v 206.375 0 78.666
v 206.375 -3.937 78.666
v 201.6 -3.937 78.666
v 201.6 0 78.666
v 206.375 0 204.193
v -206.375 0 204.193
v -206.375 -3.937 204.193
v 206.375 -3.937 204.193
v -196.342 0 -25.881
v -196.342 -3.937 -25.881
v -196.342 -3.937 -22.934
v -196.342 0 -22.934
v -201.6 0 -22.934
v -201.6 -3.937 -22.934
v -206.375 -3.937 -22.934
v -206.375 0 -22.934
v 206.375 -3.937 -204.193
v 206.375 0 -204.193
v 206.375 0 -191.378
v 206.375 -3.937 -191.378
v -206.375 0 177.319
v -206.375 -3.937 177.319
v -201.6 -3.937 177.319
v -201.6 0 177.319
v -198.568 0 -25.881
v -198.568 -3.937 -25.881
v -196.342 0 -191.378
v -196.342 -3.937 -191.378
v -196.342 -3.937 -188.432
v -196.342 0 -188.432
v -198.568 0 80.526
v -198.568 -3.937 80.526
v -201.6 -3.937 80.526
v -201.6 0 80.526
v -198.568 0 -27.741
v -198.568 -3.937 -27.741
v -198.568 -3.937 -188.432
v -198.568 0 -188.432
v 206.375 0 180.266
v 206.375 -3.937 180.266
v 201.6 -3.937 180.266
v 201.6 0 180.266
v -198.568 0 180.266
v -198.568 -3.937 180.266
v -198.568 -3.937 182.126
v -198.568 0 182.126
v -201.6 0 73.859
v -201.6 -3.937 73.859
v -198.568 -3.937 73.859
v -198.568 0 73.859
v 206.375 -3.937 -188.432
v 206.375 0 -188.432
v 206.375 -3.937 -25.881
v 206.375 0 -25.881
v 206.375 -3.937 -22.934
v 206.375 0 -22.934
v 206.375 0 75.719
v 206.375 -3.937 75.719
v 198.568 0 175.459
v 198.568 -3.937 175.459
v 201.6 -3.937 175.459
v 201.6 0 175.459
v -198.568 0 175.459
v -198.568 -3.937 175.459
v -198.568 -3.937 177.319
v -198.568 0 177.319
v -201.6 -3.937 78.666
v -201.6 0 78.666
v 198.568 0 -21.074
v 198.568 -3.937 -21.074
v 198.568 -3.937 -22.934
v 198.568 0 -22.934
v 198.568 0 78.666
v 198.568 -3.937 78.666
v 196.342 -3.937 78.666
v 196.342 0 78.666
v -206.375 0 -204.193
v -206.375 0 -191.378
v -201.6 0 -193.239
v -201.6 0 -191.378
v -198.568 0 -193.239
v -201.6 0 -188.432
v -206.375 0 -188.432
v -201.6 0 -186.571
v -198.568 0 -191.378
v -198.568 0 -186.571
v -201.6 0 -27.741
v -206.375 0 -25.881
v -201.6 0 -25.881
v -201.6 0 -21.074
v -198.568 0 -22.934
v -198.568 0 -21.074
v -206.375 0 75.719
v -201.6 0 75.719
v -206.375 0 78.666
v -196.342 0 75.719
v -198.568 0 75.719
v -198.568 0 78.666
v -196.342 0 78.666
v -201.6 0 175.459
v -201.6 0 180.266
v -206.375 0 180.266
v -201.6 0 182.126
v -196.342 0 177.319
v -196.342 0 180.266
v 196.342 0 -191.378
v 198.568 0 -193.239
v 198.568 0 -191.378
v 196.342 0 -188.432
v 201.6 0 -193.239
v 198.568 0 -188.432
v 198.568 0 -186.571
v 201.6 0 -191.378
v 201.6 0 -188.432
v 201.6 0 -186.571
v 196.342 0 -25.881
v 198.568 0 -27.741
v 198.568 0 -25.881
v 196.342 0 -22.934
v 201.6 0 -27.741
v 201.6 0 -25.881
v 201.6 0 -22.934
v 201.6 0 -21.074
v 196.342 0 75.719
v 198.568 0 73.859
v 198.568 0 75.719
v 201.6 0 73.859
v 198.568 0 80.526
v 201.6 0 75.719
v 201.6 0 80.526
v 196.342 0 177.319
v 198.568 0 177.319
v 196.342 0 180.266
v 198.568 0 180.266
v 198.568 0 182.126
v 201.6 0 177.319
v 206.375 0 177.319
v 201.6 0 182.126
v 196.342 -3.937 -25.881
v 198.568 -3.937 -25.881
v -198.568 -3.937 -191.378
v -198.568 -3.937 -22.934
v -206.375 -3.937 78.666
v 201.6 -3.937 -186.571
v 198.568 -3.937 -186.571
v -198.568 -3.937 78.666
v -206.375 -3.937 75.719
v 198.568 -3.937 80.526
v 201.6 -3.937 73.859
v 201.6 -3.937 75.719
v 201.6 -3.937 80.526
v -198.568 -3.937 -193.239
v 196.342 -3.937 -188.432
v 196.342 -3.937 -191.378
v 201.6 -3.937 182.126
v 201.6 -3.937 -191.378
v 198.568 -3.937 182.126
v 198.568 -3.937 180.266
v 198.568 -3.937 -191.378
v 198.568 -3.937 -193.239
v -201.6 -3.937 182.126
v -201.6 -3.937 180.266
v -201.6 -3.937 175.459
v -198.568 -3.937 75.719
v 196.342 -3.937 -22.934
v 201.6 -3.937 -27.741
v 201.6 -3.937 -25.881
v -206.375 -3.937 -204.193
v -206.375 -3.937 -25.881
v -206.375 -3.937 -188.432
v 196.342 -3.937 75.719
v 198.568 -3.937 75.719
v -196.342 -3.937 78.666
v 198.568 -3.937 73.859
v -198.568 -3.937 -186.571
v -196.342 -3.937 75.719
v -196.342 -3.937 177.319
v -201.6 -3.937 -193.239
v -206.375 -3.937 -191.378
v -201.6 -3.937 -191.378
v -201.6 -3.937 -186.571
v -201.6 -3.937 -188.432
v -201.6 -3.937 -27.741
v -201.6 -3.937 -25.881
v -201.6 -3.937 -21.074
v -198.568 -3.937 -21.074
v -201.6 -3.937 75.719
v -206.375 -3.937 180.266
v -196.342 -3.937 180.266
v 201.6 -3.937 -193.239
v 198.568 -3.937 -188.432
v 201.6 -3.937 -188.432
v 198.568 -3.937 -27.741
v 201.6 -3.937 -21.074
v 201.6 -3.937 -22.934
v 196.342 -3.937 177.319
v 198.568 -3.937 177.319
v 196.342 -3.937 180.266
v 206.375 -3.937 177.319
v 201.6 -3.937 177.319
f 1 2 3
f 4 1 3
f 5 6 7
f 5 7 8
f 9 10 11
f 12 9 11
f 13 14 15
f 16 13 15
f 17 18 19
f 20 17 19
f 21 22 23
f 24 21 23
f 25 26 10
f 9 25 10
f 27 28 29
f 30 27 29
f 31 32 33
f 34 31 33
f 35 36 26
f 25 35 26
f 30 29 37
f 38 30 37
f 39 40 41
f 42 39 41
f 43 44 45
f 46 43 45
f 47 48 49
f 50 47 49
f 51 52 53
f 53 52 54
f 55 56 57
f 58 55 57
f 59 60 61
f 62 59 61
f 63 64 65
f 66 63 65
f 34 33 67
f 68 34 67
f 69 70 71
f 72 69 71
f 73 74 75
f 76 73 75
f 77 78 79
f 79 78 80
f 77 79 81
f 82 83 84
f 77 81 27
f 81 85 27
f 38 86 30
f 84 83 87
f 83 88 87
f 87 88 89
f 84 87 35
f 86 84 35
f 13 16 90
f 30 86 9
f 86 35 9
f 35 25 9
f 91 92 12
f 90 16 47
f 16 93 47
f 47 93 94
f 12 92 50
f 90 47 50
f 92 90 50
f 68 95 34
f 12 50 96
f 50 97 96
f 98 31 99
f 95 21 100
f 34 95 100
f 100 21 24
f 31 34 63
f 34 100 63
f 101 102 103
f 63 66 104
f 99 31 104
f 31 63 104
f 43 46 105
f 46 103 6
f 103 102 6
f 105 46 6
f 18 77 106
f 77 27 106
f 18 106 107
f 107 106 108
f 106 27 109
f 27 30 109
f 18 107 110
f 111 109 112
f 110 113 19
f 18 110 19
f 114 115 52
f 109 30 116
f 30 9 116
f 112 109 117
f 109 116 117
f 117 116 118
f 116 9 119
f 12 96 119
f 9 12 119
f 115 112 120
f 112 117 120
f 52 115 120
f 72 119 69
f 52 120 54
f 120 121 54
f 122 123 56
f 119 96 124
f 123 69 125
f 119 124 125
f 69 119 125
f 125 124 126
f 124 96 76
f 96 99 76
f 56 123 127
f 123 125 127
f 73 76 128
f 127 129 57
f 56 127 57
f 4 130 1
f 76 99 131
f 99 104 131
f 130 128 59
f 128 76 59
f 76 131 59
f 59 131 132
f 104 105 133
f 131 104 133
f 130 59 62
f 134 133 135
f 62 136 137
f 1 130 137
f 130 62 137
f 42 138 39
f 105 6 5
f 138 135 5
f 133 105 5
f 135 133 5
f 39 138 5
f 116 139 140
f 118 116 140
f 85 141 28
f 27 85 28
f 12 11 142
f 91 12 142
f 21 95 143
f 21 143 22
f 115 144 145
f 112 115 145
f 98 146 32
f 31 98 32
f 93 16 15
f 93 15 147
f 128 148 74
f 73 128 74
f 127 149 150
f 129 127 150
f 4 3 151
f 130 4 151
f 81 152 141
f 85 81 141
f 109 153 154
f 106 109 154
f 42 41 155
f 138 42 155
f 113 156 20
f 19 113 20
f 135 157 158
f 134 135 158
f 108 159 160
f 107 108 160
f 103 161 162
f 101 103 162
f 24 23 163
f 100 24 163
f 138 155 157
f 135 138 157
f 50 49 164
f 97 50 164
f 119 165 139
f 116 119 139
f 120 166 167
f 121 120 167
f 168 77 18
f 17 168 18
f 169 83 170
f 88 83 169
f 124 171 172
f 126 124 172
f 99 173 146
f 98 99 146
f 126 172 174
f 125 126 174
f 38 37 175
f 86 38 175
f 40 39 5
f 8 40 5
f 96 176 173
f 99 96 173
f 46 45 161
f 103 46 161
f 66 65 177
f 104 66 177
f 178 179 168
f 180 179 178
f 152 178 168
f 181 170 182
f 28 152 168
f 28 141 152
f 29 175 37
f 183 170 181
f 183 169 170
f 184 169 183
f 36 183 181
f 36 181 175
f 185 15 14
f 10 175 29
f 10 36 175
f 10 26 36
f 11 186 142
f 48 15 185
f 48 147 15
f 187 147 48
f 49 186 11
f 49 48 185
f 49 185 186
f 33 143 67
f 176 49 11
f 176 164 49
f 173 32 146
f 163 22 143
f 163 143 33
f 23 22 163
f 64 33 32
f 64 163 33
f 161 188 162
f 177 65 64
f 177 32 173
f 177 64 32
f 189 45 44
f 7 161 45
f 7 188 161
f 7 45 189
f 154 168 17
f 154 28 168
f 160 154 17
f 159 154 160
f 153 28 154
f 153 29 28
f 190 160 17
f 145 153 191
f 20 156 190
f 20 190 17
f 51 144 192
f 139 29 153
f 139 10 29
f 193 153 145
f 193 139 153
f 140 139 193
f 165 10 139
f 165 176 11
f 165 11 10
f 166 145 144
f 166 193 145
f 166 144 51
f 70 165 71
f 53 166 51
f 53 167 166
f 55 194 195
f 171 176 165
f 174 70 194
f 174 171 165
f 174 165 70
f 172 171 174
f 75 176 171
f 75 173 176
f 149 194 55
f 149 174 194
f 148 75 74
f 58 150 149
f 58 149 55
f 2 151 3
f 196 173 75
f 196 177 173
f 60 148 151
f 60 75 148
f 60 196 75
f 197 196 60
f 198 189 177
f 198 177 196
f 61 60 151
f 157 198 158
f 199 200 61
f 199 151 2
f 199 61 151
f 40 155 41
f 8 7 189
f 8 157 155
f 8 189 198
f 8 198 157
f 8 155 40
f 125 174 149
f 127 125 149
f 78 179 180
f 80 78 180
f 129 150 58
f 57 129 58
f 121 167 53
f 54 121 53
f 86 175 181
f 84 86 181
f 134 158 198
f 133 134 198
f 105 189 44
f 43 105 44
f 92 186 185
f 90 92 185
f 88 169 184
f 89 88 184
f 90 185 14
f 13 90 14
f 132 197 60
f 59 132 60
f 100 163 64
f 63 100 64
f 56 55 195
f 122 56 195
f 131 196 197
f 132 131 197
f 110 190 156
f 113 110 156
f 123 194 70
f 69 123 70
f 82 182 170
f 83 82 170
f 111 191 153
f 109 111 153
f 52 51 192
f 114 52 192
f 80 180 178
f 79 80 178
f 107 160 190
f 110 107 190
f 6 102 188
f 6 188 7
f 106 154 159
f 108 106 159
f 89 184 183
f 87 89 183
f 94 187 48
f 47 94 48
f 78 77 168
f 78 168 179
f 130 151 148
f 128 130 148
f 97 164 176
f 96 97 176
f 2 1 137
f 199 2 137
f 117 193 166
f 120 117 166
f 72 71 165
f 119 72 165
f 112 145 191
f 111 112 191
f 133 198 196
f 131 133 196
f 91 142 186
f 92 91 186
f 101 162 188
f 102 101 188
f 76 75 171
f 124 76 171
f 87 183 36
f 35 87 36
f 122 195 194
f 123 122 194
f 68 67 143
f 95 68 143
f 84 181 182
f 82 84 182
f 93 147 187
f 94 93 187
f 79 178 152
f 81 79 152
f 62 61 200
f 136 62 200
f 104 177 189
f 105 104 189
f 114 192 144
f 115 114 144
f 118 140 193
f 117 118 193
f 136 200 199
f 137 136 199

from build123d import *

# Parameters (mm, degrees)
F0_W     = 412.75
F0_H     = 408.38501
F1_DEPTH = 3.937
F2_W     = 3.175
F2_H     = 2.9464
F3_DEPTH = 3.937


with BuildPart() as f1:
    # F0 (on Front) → F1 (new body)
    with BuildSketch(Plane.XZ):
        Rectangle(F0_W, F0_H)
    extrude(amount=F1_DEPTH)

    # F2 (on face) → F3 (cut, through all)
    with BuildSketch(Plane.XZ.offset(3.937)):
        Polygon((-203.2, 180.265705), (-203.2, 177.319305), (-201.5998, 177.319305), (-201.5998, 175.458755), (-198.567675, 175.458755), (-198.567675, 177.319305), (-196.342, 177.319305), (-196.342, 178.792505), (-196.342, 180.265705), (-198.567675, 180.265705), (-198.567675, 182.126255), (-201.5998, 182.126255), (-201.5998, 180.265705), align=None)
        with Locations((-204.7875, 178.792505)):
            Rectangle(F2_W, F2_H)
        Polygon((-198.567675, 80.526255), (-201.5998, 80.526255), (-201.5998, 78.665705), (-203.2, 78.665705), (-203.2, 75.719305), (-201.5998, 75.719305), (-201.5998, 73.858755), (-198.567675, 73.858755), (-198.567675, 75.719305), (-196.342, 75.719305), (-196.342, 77.192505), (-196.342, 78.665705), (-198.567675, 78.665705), align=None)
        with Locations((-204.7875, 77.192505)):
            Rectangle(F2_W, F2_H)
        Polygon((-198.567675, -21.073745), (-201.5998, -21.073745), (-201.5998, -22.934295), (-203.2, -22.934295), (-203.2, -25.880695), (-201.5998, -25.880695), (-201.5998, -27.741245), (-198.567675, -27.741245), (-198.567675, -25.880695), (-196.342, -25.880695), (-196.342, -24.407495), (-196.342, -22.934295), (-198.567675, -22.934295), align=None)
        with Locations((-204.7875, -24.407495)):
            Rectangle(F2_W, F2_H)
        Polygon((-203.2, -188.431805), (-203.2, -191.378205), (-201.5998, -191.378205), (-201.5998, -193.238755), (-198.567675, -193.238755), (-198.567675, -191.378205), (-196.342, -191.378205), (-196.342, -189.905005), (-196.342, -188.431805), (-198.567675, -188.431805), (-198.567675, -186.571255), (-201.5998, -186.571255), (-201.5998, -188.431805), align=None)
        with Locations((-204.7875, -189.905005)):
            Rectangle(F2_W, F2_H)
        with Locations((204.7875, 178.792505)):
            Rectangle(F2_W, F2_H)
        Polygon((203.2, 177.319305), (203.2, 180.265705), (201.5998, 180.265705), (201.5998, 182.126255), (198.567675, 182.126255), (198.567675, 180.265705), (196.342, 180.265705), (196.342, 178.792505), (196.342, 177.319305), (198.567675, 177.319305), (198.567675, 175.458755), (201.5998, 175.458755), (201.5998, 177.319305), align=None)
        Polygon((198.567675, -188.431805), (196.342, -188.431805), (196.342, -189.905005), (196.342, -191.378205), (198.567675, -191.378205), (198.567675, -193.238755), (201.5998, -193.238755), (201.5998, -191.378205), (203.2, -191.378205), (203.2, -188.431805), (201.5998, -188.431805), (201.5998, -186.571255), (198.567675, -186.571255), align=None)
        with Locations((204.7875, -189.905005)):
            Rectangle(F2_W, F2_H)
        Polygon((196.342, 75.719305), (198.567675, 75.719305), (198.567675, 73.858755), (201.5998, 73.858755), (201.5998, 75.719305), (203.2, 75.719305), (203.2, 78.665705), (201.5998, 78.665705), (201.5998, 80.526255), (198.567675, 80.526255), (198.567675, 78.665705), (196.342, 78.665705), (196.342, 77.192505), align=None)
        with Locations((204.7875, 77.192505)):
            Rectangle(F2_W, F2_H)
        Polygon((198.567675, -21.073745), (198.567675, -22.934295), (196.342, -22.934295), (196.342, -24.407495), (196.342, -25.880695), (198.567675, -25.880695), (198.567675, -27.741245), (201.5998, -27.741245), (201.5998, -25.880695), (203.2, -25.880695), (203.2, -22.934295), (201.5998, -22.934295), (201.5998, -21.073745), align=None)
        with Locations((204.7875, -24.407495)):
            Rectangle(F2_W, F2_H)
    extrude(amount=-F3_DEPTH, mode=Mode.SUBTRACT)


solid = f1.part
